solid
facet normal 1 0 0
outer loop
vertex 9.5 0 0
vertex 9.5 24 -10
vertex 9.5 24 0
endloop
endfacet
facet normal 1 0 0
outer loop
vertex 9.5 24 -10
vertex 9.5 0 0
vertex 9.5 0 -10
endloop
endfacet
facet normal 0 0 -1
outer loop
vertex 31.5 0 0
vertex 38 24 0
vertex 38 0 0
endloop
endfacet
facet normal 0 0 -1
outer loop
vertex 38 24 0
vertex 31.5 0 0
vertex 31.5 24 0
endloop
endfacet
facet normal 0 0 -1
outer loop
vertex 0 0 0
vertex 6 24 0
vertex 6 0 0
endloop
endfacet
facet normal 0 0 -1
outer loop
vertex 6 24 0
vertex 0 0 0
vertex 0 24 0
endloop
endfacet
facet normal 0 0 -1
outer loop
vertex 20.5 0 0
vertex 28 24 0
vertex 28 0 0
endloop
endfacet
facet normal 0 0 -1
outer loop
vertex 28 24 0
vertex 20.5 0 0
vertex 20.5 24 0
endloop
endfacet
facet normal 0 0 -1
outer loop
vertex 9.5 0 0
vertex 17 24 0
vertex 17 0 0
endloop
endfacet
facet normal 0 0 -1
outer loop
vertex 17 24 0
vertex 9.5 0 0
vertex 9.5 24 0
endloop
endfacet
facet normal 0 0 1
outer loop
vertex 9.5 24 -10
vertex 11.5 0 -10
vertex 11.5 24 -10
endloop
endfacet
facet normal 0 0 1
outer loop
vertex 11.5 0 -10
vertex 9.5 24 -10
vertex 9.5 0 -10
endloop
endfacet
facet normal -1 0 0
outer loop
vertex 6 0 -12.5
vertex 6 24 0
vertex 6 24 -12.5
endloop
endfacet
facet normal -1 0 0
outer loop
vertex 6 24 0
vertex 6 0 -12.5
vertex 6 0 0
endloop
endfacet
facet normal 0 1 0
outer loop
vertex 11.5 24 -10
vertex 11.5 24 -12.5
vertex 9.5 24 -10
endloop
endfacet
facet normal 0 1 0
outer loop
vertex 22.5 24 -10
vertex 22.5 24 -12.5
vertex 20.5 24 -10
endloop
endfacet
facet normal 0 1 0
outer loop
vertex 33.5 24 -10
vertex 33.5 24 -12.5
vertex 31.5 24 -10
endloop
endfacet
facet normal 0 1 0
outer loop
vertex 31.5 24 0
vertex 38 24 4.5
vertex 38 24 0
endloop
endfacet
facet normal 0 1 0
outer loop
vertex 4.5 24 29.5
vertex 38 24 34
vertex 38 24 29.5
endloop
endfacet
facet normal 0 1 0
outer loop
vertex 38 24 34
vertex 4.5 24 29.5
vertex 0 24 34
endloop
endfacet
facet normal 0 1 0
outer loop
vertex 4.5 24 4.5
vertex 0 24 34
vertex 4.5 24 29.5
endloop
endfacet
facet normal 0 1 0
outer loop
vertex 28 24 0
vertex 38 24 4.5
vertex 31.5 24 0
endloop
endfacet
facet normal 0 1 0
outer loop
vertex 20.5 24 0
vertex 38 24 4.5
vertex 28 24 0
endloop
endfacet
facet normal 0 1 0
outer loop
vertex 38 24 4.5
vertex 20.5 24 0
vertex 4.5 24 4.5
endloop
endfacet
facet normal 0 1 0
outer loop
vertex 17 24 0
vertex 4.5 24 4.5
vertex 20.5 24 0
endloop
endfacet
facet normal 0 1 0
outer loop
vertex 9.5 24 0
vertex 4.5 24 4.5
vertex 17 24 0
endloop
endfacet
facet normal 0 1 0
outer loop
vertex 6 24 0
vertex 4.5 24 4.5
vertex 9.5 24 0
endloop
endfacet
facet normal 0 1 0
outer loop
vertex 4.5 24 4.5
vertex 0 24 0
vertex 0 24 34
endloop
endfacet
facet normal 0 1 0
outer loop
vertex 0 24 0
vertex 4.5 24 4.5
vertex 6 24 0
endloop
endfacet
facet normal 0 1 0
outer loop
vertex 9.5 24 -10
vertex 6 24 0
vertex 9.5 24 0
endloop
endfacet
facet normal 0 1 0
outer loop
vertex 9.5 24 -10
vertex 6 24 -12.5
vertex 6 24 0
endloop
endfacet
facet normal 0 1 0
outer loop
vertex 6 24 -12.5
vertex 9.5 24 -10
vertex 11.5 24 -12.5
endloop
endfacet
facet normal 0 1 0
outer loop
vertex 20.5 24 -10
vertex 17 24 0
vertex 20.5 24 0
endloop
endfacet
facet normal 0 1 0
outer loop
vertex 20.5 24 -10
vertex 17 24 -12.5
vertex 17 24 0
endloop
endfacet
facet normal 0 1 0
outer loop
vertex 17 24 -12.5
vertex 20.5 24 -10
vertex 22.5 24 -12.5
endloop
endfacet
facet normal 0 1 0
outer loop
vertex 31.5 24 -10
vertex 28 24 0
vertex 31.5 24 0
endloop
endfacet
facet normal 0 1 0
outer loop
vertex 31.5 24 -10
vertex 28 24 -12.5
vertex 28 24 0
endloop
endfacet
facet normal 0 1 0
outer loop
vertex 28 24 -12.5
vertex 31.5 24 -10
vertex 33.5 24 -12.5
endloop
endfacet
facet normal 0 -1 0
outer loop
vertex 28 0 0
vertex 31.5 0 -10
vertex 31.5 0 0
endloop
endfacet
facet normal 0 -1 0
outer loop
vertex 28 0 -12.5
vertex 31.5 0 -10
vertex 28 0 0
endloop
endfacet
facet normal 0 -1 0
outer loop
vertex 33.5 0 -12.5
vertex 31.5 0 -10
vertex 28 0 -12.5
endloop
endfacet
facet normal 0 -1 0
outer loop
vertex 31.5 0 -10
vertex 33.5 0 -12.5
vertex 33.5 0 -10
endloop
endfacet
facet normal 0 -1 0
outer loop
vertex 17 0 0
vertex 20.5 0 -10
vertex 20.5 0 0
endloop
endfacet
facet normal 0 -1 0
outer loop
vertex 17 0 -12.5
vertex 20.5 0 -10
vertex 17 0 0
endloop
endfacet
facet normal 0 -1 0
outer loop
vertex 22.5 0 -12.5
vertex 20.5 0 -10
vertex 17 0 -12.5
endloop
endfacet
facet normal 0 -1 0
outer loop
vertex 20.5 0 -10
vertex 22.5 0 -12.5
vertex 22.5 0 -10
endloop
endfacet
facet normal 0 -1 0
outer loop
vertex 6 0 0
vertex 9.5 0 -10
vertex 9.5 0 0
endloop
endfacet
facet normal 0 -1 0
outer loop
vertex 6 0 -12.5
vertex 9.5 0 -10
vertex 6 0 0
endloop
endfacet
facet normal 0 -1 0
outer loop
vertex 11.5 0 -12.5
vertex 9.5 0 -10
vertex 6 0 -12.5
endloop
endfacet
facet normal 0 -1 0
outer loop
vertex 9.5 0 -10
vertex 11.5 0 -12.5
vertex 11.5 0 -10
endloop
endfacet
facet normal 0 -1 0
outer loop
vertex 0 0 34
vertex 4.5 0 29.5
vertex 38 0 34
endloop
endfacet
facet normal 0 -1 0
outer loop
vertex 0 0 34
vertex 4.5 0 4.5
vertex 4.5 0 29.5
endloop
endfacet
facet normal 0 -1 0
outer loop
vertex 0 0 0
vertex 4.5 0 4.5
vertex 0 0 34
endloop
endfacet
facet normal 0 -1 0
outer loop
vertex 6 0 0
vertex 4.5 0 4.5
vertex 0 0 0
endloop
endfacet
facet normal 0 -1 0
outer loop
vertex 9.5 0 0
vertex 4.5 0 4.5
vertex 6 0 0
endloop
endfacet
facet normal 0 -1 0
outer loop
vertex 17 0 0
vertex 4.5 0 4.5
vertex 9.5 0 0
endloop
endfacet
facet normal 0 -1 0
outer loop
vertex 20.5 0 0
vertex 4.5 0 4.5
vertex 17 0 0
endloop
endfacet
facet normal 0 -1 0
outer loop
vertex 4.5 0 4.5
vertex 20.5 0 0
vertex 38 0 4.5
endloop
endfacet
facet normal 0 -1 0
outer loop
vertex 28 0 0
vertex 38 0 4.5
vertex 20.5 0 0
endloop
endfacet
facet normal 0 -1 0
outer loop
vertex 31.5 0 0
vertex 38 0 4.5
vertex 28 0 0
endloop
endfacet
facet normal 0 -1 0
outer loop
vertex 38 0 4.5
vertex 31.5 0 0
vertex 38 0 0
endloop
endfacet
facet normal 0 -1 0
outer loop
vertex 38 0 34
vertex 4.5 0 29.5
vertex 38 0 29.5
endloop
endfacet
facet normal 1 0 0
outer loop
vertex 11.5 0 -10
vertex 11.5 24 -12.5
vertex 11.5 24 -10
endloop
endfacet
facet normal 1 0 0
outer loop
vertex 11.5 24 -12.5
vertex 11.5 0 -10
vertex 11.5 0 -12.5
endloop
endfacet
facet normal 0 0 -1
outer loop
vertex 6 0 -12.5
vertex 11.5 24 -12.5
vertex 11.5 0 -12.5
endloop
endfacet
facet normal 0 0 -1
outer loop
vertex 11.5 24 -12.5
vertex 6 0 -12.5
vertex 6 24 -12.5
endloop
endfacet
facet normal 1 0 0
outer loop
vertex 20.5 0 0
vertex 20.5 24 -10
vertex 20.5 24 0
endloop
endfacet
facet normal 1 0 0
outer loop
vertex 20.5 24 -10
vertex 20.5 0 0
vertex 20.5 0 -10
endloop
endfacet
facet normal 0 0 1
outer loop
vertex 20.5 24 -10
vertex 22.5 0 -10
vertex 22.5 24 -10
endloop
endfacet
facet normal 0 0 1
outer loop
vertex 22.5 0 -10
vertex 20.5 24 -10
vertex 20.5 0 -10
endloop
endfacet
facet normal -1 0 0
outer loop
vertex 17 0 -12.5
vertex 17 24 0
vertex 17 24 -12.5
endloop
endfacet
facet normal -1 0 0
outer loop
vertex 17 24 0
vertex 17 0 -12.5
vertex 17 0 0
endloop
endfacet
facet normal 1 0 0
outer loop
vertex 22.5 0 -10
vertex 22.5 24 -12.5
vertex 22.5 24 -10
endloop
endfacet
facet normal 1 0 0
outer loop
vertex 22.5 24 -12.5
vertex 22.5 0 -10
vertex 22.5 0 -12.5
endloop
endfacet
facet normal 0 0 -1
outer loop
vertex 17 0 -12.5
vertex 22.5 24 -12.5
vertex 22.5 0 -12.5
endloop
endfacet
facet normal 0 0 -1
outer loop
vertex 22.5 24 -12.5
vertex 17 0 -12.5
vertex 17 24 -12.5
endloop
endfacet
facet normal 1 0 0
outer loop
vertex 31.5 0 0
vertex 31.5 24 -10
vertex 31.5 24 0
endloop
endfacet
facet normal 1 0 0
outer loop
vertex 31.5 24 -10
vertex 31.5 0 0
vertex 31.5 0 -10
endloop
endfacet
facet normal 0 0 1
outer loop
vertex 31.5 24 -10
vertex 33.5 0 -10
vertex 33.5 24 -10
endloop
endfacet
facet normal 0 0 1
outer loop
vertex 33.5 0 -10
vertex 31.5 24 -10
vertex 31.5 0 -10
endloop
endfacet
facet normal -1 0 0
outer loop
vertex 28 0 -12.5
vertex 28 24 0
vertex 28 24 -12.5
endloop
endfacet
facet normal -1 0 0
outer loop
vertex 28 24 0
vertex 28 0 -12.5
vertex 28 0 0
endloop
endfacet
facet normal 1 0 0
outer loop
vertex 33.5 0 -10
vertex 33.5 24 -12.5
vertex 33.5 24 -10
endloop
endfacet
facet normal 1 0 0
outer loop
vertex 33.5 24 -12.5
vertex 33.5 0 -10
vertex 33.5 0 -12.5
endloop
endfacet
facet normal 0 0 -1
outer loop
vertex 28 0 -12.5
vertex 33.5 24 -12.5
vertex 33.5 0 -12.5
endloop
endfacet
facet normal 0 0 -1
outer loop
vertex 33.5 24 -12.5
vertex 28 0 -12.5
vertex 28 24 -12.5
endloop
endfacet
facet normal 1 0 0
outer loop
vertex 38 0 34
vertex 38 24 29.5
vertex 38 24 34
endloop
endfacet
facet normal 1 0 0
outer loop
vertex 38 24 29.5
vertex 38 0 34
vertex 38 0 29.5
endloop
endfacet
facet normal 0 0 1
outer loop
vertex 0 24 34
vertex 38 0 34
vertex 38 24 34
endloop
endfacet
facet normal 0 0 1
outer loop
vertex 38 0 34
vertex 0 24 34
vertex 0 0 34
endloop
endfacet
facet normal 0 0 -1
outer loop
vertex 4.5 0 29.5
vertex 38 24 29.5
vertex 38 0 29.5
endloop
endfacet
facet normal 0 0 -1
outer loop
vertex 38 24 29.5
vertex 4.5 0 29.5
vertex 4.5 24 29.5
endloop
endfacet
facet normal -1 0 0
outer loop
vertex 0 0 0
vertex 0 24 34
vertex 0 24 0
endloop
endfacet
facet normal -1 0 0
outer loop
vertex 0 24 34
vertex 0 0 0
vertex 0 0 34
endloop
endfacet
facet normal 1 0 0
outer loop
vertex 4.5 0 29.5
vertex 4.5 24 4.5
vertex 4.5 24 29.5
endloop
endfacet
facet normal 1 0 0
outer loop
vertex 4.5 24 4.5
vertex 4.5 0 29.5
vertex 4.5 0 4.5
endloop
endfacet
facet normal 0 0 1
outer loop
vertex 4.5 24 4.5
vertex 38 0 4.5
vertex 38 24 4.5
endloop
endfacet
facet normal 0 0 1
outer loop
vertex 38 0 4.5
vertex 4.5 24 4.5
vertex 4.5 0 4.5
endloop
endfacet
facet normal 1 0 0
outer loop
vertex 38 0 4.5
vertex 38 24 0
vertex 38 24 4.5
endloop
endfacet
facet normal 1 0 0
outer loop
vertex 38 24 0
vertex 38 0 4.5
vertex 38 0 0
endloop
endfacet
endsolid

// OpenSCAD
// ============================================================================
// DeskSwipe & ErgoSwipe — Parametric 3D Printable Desk Mods (OpenSCAD / MakerWorld Customizer)
// License: CC BY-NC-SA 4.0 | https://fhmch.github.io/DeskSwipe/
// ============================================================================

/* [Parameters] */
// Tabletop Thickness in mm (measure your desk before printing)
desk_thickness = 25.0; // [15:0.5:45]
// Clamp Width in mm
clamp_width = 24.0; // [15:1:40]
// Wall Thickness in mm (4.5mm+ recommended for PETG/PLA+)
wall_thickness = 4.5; // [3:0.5:8]
// Clamp Jaw Depth in mm
jaw_depth = 38.0; // [25:1:60]
// Part Type ("cable_clip", "headphone_hook")
part_type = "cable_clip"; // ["cable_clip", "headphone_hook"]

module cable_clip() {
    // Top Jaw
    translate([0, 0, wall_thickness + desk_thickness])
        cube([jaw_depth, clamp_width, wall_thickness]);
    // Spine
    translate([0, 0, wall_thickness])
        cube([wall_thickness, clamp_width, desk_thickness]);
    // Bottom Jaw
    cube([jaw_depth, clamp_width, wall_thickness]);
    // 3 Cable Slots
    for (fx = [6, 17, 28]) {
        translate([fx, 0, -10])
            cube([3.5, clamp_width, 10]);
        translate([fx, 0, -12.5])
            cube([5.5, clamp_width, 2.5]);
    }
}

module headphone_hook() {
    // Top Jaw
    translate([0, 0, wall_thickness + desk_thickness])
        cube([jaw_depth, clamp_width, wall_thickness]);
    // Spine + Hanger Drop
    translate([0, 0, -45])
        cube([wall_thickness, clamp_width, 45 + 2 * wall_thickness + desk_thickness]);
    // Bottom Jaw
    translate([wall_thickness, 0, 0])
        cube([jaw_depth * 0.85, clamp_width, wall_thickness]);
    // Headphone Cradle
    translate([-38, 0, -45])
        cube([38, clamp_width, wall_thickness]);
    // Retention Lip
    translate([-38, 0, -45 + wall_thickness])
        cube([wall_thickness, clamp_width, 17]);
}

if (part_type == "cable_clip") {
    cable_clip();
} else {
    headphone_hook();
}
